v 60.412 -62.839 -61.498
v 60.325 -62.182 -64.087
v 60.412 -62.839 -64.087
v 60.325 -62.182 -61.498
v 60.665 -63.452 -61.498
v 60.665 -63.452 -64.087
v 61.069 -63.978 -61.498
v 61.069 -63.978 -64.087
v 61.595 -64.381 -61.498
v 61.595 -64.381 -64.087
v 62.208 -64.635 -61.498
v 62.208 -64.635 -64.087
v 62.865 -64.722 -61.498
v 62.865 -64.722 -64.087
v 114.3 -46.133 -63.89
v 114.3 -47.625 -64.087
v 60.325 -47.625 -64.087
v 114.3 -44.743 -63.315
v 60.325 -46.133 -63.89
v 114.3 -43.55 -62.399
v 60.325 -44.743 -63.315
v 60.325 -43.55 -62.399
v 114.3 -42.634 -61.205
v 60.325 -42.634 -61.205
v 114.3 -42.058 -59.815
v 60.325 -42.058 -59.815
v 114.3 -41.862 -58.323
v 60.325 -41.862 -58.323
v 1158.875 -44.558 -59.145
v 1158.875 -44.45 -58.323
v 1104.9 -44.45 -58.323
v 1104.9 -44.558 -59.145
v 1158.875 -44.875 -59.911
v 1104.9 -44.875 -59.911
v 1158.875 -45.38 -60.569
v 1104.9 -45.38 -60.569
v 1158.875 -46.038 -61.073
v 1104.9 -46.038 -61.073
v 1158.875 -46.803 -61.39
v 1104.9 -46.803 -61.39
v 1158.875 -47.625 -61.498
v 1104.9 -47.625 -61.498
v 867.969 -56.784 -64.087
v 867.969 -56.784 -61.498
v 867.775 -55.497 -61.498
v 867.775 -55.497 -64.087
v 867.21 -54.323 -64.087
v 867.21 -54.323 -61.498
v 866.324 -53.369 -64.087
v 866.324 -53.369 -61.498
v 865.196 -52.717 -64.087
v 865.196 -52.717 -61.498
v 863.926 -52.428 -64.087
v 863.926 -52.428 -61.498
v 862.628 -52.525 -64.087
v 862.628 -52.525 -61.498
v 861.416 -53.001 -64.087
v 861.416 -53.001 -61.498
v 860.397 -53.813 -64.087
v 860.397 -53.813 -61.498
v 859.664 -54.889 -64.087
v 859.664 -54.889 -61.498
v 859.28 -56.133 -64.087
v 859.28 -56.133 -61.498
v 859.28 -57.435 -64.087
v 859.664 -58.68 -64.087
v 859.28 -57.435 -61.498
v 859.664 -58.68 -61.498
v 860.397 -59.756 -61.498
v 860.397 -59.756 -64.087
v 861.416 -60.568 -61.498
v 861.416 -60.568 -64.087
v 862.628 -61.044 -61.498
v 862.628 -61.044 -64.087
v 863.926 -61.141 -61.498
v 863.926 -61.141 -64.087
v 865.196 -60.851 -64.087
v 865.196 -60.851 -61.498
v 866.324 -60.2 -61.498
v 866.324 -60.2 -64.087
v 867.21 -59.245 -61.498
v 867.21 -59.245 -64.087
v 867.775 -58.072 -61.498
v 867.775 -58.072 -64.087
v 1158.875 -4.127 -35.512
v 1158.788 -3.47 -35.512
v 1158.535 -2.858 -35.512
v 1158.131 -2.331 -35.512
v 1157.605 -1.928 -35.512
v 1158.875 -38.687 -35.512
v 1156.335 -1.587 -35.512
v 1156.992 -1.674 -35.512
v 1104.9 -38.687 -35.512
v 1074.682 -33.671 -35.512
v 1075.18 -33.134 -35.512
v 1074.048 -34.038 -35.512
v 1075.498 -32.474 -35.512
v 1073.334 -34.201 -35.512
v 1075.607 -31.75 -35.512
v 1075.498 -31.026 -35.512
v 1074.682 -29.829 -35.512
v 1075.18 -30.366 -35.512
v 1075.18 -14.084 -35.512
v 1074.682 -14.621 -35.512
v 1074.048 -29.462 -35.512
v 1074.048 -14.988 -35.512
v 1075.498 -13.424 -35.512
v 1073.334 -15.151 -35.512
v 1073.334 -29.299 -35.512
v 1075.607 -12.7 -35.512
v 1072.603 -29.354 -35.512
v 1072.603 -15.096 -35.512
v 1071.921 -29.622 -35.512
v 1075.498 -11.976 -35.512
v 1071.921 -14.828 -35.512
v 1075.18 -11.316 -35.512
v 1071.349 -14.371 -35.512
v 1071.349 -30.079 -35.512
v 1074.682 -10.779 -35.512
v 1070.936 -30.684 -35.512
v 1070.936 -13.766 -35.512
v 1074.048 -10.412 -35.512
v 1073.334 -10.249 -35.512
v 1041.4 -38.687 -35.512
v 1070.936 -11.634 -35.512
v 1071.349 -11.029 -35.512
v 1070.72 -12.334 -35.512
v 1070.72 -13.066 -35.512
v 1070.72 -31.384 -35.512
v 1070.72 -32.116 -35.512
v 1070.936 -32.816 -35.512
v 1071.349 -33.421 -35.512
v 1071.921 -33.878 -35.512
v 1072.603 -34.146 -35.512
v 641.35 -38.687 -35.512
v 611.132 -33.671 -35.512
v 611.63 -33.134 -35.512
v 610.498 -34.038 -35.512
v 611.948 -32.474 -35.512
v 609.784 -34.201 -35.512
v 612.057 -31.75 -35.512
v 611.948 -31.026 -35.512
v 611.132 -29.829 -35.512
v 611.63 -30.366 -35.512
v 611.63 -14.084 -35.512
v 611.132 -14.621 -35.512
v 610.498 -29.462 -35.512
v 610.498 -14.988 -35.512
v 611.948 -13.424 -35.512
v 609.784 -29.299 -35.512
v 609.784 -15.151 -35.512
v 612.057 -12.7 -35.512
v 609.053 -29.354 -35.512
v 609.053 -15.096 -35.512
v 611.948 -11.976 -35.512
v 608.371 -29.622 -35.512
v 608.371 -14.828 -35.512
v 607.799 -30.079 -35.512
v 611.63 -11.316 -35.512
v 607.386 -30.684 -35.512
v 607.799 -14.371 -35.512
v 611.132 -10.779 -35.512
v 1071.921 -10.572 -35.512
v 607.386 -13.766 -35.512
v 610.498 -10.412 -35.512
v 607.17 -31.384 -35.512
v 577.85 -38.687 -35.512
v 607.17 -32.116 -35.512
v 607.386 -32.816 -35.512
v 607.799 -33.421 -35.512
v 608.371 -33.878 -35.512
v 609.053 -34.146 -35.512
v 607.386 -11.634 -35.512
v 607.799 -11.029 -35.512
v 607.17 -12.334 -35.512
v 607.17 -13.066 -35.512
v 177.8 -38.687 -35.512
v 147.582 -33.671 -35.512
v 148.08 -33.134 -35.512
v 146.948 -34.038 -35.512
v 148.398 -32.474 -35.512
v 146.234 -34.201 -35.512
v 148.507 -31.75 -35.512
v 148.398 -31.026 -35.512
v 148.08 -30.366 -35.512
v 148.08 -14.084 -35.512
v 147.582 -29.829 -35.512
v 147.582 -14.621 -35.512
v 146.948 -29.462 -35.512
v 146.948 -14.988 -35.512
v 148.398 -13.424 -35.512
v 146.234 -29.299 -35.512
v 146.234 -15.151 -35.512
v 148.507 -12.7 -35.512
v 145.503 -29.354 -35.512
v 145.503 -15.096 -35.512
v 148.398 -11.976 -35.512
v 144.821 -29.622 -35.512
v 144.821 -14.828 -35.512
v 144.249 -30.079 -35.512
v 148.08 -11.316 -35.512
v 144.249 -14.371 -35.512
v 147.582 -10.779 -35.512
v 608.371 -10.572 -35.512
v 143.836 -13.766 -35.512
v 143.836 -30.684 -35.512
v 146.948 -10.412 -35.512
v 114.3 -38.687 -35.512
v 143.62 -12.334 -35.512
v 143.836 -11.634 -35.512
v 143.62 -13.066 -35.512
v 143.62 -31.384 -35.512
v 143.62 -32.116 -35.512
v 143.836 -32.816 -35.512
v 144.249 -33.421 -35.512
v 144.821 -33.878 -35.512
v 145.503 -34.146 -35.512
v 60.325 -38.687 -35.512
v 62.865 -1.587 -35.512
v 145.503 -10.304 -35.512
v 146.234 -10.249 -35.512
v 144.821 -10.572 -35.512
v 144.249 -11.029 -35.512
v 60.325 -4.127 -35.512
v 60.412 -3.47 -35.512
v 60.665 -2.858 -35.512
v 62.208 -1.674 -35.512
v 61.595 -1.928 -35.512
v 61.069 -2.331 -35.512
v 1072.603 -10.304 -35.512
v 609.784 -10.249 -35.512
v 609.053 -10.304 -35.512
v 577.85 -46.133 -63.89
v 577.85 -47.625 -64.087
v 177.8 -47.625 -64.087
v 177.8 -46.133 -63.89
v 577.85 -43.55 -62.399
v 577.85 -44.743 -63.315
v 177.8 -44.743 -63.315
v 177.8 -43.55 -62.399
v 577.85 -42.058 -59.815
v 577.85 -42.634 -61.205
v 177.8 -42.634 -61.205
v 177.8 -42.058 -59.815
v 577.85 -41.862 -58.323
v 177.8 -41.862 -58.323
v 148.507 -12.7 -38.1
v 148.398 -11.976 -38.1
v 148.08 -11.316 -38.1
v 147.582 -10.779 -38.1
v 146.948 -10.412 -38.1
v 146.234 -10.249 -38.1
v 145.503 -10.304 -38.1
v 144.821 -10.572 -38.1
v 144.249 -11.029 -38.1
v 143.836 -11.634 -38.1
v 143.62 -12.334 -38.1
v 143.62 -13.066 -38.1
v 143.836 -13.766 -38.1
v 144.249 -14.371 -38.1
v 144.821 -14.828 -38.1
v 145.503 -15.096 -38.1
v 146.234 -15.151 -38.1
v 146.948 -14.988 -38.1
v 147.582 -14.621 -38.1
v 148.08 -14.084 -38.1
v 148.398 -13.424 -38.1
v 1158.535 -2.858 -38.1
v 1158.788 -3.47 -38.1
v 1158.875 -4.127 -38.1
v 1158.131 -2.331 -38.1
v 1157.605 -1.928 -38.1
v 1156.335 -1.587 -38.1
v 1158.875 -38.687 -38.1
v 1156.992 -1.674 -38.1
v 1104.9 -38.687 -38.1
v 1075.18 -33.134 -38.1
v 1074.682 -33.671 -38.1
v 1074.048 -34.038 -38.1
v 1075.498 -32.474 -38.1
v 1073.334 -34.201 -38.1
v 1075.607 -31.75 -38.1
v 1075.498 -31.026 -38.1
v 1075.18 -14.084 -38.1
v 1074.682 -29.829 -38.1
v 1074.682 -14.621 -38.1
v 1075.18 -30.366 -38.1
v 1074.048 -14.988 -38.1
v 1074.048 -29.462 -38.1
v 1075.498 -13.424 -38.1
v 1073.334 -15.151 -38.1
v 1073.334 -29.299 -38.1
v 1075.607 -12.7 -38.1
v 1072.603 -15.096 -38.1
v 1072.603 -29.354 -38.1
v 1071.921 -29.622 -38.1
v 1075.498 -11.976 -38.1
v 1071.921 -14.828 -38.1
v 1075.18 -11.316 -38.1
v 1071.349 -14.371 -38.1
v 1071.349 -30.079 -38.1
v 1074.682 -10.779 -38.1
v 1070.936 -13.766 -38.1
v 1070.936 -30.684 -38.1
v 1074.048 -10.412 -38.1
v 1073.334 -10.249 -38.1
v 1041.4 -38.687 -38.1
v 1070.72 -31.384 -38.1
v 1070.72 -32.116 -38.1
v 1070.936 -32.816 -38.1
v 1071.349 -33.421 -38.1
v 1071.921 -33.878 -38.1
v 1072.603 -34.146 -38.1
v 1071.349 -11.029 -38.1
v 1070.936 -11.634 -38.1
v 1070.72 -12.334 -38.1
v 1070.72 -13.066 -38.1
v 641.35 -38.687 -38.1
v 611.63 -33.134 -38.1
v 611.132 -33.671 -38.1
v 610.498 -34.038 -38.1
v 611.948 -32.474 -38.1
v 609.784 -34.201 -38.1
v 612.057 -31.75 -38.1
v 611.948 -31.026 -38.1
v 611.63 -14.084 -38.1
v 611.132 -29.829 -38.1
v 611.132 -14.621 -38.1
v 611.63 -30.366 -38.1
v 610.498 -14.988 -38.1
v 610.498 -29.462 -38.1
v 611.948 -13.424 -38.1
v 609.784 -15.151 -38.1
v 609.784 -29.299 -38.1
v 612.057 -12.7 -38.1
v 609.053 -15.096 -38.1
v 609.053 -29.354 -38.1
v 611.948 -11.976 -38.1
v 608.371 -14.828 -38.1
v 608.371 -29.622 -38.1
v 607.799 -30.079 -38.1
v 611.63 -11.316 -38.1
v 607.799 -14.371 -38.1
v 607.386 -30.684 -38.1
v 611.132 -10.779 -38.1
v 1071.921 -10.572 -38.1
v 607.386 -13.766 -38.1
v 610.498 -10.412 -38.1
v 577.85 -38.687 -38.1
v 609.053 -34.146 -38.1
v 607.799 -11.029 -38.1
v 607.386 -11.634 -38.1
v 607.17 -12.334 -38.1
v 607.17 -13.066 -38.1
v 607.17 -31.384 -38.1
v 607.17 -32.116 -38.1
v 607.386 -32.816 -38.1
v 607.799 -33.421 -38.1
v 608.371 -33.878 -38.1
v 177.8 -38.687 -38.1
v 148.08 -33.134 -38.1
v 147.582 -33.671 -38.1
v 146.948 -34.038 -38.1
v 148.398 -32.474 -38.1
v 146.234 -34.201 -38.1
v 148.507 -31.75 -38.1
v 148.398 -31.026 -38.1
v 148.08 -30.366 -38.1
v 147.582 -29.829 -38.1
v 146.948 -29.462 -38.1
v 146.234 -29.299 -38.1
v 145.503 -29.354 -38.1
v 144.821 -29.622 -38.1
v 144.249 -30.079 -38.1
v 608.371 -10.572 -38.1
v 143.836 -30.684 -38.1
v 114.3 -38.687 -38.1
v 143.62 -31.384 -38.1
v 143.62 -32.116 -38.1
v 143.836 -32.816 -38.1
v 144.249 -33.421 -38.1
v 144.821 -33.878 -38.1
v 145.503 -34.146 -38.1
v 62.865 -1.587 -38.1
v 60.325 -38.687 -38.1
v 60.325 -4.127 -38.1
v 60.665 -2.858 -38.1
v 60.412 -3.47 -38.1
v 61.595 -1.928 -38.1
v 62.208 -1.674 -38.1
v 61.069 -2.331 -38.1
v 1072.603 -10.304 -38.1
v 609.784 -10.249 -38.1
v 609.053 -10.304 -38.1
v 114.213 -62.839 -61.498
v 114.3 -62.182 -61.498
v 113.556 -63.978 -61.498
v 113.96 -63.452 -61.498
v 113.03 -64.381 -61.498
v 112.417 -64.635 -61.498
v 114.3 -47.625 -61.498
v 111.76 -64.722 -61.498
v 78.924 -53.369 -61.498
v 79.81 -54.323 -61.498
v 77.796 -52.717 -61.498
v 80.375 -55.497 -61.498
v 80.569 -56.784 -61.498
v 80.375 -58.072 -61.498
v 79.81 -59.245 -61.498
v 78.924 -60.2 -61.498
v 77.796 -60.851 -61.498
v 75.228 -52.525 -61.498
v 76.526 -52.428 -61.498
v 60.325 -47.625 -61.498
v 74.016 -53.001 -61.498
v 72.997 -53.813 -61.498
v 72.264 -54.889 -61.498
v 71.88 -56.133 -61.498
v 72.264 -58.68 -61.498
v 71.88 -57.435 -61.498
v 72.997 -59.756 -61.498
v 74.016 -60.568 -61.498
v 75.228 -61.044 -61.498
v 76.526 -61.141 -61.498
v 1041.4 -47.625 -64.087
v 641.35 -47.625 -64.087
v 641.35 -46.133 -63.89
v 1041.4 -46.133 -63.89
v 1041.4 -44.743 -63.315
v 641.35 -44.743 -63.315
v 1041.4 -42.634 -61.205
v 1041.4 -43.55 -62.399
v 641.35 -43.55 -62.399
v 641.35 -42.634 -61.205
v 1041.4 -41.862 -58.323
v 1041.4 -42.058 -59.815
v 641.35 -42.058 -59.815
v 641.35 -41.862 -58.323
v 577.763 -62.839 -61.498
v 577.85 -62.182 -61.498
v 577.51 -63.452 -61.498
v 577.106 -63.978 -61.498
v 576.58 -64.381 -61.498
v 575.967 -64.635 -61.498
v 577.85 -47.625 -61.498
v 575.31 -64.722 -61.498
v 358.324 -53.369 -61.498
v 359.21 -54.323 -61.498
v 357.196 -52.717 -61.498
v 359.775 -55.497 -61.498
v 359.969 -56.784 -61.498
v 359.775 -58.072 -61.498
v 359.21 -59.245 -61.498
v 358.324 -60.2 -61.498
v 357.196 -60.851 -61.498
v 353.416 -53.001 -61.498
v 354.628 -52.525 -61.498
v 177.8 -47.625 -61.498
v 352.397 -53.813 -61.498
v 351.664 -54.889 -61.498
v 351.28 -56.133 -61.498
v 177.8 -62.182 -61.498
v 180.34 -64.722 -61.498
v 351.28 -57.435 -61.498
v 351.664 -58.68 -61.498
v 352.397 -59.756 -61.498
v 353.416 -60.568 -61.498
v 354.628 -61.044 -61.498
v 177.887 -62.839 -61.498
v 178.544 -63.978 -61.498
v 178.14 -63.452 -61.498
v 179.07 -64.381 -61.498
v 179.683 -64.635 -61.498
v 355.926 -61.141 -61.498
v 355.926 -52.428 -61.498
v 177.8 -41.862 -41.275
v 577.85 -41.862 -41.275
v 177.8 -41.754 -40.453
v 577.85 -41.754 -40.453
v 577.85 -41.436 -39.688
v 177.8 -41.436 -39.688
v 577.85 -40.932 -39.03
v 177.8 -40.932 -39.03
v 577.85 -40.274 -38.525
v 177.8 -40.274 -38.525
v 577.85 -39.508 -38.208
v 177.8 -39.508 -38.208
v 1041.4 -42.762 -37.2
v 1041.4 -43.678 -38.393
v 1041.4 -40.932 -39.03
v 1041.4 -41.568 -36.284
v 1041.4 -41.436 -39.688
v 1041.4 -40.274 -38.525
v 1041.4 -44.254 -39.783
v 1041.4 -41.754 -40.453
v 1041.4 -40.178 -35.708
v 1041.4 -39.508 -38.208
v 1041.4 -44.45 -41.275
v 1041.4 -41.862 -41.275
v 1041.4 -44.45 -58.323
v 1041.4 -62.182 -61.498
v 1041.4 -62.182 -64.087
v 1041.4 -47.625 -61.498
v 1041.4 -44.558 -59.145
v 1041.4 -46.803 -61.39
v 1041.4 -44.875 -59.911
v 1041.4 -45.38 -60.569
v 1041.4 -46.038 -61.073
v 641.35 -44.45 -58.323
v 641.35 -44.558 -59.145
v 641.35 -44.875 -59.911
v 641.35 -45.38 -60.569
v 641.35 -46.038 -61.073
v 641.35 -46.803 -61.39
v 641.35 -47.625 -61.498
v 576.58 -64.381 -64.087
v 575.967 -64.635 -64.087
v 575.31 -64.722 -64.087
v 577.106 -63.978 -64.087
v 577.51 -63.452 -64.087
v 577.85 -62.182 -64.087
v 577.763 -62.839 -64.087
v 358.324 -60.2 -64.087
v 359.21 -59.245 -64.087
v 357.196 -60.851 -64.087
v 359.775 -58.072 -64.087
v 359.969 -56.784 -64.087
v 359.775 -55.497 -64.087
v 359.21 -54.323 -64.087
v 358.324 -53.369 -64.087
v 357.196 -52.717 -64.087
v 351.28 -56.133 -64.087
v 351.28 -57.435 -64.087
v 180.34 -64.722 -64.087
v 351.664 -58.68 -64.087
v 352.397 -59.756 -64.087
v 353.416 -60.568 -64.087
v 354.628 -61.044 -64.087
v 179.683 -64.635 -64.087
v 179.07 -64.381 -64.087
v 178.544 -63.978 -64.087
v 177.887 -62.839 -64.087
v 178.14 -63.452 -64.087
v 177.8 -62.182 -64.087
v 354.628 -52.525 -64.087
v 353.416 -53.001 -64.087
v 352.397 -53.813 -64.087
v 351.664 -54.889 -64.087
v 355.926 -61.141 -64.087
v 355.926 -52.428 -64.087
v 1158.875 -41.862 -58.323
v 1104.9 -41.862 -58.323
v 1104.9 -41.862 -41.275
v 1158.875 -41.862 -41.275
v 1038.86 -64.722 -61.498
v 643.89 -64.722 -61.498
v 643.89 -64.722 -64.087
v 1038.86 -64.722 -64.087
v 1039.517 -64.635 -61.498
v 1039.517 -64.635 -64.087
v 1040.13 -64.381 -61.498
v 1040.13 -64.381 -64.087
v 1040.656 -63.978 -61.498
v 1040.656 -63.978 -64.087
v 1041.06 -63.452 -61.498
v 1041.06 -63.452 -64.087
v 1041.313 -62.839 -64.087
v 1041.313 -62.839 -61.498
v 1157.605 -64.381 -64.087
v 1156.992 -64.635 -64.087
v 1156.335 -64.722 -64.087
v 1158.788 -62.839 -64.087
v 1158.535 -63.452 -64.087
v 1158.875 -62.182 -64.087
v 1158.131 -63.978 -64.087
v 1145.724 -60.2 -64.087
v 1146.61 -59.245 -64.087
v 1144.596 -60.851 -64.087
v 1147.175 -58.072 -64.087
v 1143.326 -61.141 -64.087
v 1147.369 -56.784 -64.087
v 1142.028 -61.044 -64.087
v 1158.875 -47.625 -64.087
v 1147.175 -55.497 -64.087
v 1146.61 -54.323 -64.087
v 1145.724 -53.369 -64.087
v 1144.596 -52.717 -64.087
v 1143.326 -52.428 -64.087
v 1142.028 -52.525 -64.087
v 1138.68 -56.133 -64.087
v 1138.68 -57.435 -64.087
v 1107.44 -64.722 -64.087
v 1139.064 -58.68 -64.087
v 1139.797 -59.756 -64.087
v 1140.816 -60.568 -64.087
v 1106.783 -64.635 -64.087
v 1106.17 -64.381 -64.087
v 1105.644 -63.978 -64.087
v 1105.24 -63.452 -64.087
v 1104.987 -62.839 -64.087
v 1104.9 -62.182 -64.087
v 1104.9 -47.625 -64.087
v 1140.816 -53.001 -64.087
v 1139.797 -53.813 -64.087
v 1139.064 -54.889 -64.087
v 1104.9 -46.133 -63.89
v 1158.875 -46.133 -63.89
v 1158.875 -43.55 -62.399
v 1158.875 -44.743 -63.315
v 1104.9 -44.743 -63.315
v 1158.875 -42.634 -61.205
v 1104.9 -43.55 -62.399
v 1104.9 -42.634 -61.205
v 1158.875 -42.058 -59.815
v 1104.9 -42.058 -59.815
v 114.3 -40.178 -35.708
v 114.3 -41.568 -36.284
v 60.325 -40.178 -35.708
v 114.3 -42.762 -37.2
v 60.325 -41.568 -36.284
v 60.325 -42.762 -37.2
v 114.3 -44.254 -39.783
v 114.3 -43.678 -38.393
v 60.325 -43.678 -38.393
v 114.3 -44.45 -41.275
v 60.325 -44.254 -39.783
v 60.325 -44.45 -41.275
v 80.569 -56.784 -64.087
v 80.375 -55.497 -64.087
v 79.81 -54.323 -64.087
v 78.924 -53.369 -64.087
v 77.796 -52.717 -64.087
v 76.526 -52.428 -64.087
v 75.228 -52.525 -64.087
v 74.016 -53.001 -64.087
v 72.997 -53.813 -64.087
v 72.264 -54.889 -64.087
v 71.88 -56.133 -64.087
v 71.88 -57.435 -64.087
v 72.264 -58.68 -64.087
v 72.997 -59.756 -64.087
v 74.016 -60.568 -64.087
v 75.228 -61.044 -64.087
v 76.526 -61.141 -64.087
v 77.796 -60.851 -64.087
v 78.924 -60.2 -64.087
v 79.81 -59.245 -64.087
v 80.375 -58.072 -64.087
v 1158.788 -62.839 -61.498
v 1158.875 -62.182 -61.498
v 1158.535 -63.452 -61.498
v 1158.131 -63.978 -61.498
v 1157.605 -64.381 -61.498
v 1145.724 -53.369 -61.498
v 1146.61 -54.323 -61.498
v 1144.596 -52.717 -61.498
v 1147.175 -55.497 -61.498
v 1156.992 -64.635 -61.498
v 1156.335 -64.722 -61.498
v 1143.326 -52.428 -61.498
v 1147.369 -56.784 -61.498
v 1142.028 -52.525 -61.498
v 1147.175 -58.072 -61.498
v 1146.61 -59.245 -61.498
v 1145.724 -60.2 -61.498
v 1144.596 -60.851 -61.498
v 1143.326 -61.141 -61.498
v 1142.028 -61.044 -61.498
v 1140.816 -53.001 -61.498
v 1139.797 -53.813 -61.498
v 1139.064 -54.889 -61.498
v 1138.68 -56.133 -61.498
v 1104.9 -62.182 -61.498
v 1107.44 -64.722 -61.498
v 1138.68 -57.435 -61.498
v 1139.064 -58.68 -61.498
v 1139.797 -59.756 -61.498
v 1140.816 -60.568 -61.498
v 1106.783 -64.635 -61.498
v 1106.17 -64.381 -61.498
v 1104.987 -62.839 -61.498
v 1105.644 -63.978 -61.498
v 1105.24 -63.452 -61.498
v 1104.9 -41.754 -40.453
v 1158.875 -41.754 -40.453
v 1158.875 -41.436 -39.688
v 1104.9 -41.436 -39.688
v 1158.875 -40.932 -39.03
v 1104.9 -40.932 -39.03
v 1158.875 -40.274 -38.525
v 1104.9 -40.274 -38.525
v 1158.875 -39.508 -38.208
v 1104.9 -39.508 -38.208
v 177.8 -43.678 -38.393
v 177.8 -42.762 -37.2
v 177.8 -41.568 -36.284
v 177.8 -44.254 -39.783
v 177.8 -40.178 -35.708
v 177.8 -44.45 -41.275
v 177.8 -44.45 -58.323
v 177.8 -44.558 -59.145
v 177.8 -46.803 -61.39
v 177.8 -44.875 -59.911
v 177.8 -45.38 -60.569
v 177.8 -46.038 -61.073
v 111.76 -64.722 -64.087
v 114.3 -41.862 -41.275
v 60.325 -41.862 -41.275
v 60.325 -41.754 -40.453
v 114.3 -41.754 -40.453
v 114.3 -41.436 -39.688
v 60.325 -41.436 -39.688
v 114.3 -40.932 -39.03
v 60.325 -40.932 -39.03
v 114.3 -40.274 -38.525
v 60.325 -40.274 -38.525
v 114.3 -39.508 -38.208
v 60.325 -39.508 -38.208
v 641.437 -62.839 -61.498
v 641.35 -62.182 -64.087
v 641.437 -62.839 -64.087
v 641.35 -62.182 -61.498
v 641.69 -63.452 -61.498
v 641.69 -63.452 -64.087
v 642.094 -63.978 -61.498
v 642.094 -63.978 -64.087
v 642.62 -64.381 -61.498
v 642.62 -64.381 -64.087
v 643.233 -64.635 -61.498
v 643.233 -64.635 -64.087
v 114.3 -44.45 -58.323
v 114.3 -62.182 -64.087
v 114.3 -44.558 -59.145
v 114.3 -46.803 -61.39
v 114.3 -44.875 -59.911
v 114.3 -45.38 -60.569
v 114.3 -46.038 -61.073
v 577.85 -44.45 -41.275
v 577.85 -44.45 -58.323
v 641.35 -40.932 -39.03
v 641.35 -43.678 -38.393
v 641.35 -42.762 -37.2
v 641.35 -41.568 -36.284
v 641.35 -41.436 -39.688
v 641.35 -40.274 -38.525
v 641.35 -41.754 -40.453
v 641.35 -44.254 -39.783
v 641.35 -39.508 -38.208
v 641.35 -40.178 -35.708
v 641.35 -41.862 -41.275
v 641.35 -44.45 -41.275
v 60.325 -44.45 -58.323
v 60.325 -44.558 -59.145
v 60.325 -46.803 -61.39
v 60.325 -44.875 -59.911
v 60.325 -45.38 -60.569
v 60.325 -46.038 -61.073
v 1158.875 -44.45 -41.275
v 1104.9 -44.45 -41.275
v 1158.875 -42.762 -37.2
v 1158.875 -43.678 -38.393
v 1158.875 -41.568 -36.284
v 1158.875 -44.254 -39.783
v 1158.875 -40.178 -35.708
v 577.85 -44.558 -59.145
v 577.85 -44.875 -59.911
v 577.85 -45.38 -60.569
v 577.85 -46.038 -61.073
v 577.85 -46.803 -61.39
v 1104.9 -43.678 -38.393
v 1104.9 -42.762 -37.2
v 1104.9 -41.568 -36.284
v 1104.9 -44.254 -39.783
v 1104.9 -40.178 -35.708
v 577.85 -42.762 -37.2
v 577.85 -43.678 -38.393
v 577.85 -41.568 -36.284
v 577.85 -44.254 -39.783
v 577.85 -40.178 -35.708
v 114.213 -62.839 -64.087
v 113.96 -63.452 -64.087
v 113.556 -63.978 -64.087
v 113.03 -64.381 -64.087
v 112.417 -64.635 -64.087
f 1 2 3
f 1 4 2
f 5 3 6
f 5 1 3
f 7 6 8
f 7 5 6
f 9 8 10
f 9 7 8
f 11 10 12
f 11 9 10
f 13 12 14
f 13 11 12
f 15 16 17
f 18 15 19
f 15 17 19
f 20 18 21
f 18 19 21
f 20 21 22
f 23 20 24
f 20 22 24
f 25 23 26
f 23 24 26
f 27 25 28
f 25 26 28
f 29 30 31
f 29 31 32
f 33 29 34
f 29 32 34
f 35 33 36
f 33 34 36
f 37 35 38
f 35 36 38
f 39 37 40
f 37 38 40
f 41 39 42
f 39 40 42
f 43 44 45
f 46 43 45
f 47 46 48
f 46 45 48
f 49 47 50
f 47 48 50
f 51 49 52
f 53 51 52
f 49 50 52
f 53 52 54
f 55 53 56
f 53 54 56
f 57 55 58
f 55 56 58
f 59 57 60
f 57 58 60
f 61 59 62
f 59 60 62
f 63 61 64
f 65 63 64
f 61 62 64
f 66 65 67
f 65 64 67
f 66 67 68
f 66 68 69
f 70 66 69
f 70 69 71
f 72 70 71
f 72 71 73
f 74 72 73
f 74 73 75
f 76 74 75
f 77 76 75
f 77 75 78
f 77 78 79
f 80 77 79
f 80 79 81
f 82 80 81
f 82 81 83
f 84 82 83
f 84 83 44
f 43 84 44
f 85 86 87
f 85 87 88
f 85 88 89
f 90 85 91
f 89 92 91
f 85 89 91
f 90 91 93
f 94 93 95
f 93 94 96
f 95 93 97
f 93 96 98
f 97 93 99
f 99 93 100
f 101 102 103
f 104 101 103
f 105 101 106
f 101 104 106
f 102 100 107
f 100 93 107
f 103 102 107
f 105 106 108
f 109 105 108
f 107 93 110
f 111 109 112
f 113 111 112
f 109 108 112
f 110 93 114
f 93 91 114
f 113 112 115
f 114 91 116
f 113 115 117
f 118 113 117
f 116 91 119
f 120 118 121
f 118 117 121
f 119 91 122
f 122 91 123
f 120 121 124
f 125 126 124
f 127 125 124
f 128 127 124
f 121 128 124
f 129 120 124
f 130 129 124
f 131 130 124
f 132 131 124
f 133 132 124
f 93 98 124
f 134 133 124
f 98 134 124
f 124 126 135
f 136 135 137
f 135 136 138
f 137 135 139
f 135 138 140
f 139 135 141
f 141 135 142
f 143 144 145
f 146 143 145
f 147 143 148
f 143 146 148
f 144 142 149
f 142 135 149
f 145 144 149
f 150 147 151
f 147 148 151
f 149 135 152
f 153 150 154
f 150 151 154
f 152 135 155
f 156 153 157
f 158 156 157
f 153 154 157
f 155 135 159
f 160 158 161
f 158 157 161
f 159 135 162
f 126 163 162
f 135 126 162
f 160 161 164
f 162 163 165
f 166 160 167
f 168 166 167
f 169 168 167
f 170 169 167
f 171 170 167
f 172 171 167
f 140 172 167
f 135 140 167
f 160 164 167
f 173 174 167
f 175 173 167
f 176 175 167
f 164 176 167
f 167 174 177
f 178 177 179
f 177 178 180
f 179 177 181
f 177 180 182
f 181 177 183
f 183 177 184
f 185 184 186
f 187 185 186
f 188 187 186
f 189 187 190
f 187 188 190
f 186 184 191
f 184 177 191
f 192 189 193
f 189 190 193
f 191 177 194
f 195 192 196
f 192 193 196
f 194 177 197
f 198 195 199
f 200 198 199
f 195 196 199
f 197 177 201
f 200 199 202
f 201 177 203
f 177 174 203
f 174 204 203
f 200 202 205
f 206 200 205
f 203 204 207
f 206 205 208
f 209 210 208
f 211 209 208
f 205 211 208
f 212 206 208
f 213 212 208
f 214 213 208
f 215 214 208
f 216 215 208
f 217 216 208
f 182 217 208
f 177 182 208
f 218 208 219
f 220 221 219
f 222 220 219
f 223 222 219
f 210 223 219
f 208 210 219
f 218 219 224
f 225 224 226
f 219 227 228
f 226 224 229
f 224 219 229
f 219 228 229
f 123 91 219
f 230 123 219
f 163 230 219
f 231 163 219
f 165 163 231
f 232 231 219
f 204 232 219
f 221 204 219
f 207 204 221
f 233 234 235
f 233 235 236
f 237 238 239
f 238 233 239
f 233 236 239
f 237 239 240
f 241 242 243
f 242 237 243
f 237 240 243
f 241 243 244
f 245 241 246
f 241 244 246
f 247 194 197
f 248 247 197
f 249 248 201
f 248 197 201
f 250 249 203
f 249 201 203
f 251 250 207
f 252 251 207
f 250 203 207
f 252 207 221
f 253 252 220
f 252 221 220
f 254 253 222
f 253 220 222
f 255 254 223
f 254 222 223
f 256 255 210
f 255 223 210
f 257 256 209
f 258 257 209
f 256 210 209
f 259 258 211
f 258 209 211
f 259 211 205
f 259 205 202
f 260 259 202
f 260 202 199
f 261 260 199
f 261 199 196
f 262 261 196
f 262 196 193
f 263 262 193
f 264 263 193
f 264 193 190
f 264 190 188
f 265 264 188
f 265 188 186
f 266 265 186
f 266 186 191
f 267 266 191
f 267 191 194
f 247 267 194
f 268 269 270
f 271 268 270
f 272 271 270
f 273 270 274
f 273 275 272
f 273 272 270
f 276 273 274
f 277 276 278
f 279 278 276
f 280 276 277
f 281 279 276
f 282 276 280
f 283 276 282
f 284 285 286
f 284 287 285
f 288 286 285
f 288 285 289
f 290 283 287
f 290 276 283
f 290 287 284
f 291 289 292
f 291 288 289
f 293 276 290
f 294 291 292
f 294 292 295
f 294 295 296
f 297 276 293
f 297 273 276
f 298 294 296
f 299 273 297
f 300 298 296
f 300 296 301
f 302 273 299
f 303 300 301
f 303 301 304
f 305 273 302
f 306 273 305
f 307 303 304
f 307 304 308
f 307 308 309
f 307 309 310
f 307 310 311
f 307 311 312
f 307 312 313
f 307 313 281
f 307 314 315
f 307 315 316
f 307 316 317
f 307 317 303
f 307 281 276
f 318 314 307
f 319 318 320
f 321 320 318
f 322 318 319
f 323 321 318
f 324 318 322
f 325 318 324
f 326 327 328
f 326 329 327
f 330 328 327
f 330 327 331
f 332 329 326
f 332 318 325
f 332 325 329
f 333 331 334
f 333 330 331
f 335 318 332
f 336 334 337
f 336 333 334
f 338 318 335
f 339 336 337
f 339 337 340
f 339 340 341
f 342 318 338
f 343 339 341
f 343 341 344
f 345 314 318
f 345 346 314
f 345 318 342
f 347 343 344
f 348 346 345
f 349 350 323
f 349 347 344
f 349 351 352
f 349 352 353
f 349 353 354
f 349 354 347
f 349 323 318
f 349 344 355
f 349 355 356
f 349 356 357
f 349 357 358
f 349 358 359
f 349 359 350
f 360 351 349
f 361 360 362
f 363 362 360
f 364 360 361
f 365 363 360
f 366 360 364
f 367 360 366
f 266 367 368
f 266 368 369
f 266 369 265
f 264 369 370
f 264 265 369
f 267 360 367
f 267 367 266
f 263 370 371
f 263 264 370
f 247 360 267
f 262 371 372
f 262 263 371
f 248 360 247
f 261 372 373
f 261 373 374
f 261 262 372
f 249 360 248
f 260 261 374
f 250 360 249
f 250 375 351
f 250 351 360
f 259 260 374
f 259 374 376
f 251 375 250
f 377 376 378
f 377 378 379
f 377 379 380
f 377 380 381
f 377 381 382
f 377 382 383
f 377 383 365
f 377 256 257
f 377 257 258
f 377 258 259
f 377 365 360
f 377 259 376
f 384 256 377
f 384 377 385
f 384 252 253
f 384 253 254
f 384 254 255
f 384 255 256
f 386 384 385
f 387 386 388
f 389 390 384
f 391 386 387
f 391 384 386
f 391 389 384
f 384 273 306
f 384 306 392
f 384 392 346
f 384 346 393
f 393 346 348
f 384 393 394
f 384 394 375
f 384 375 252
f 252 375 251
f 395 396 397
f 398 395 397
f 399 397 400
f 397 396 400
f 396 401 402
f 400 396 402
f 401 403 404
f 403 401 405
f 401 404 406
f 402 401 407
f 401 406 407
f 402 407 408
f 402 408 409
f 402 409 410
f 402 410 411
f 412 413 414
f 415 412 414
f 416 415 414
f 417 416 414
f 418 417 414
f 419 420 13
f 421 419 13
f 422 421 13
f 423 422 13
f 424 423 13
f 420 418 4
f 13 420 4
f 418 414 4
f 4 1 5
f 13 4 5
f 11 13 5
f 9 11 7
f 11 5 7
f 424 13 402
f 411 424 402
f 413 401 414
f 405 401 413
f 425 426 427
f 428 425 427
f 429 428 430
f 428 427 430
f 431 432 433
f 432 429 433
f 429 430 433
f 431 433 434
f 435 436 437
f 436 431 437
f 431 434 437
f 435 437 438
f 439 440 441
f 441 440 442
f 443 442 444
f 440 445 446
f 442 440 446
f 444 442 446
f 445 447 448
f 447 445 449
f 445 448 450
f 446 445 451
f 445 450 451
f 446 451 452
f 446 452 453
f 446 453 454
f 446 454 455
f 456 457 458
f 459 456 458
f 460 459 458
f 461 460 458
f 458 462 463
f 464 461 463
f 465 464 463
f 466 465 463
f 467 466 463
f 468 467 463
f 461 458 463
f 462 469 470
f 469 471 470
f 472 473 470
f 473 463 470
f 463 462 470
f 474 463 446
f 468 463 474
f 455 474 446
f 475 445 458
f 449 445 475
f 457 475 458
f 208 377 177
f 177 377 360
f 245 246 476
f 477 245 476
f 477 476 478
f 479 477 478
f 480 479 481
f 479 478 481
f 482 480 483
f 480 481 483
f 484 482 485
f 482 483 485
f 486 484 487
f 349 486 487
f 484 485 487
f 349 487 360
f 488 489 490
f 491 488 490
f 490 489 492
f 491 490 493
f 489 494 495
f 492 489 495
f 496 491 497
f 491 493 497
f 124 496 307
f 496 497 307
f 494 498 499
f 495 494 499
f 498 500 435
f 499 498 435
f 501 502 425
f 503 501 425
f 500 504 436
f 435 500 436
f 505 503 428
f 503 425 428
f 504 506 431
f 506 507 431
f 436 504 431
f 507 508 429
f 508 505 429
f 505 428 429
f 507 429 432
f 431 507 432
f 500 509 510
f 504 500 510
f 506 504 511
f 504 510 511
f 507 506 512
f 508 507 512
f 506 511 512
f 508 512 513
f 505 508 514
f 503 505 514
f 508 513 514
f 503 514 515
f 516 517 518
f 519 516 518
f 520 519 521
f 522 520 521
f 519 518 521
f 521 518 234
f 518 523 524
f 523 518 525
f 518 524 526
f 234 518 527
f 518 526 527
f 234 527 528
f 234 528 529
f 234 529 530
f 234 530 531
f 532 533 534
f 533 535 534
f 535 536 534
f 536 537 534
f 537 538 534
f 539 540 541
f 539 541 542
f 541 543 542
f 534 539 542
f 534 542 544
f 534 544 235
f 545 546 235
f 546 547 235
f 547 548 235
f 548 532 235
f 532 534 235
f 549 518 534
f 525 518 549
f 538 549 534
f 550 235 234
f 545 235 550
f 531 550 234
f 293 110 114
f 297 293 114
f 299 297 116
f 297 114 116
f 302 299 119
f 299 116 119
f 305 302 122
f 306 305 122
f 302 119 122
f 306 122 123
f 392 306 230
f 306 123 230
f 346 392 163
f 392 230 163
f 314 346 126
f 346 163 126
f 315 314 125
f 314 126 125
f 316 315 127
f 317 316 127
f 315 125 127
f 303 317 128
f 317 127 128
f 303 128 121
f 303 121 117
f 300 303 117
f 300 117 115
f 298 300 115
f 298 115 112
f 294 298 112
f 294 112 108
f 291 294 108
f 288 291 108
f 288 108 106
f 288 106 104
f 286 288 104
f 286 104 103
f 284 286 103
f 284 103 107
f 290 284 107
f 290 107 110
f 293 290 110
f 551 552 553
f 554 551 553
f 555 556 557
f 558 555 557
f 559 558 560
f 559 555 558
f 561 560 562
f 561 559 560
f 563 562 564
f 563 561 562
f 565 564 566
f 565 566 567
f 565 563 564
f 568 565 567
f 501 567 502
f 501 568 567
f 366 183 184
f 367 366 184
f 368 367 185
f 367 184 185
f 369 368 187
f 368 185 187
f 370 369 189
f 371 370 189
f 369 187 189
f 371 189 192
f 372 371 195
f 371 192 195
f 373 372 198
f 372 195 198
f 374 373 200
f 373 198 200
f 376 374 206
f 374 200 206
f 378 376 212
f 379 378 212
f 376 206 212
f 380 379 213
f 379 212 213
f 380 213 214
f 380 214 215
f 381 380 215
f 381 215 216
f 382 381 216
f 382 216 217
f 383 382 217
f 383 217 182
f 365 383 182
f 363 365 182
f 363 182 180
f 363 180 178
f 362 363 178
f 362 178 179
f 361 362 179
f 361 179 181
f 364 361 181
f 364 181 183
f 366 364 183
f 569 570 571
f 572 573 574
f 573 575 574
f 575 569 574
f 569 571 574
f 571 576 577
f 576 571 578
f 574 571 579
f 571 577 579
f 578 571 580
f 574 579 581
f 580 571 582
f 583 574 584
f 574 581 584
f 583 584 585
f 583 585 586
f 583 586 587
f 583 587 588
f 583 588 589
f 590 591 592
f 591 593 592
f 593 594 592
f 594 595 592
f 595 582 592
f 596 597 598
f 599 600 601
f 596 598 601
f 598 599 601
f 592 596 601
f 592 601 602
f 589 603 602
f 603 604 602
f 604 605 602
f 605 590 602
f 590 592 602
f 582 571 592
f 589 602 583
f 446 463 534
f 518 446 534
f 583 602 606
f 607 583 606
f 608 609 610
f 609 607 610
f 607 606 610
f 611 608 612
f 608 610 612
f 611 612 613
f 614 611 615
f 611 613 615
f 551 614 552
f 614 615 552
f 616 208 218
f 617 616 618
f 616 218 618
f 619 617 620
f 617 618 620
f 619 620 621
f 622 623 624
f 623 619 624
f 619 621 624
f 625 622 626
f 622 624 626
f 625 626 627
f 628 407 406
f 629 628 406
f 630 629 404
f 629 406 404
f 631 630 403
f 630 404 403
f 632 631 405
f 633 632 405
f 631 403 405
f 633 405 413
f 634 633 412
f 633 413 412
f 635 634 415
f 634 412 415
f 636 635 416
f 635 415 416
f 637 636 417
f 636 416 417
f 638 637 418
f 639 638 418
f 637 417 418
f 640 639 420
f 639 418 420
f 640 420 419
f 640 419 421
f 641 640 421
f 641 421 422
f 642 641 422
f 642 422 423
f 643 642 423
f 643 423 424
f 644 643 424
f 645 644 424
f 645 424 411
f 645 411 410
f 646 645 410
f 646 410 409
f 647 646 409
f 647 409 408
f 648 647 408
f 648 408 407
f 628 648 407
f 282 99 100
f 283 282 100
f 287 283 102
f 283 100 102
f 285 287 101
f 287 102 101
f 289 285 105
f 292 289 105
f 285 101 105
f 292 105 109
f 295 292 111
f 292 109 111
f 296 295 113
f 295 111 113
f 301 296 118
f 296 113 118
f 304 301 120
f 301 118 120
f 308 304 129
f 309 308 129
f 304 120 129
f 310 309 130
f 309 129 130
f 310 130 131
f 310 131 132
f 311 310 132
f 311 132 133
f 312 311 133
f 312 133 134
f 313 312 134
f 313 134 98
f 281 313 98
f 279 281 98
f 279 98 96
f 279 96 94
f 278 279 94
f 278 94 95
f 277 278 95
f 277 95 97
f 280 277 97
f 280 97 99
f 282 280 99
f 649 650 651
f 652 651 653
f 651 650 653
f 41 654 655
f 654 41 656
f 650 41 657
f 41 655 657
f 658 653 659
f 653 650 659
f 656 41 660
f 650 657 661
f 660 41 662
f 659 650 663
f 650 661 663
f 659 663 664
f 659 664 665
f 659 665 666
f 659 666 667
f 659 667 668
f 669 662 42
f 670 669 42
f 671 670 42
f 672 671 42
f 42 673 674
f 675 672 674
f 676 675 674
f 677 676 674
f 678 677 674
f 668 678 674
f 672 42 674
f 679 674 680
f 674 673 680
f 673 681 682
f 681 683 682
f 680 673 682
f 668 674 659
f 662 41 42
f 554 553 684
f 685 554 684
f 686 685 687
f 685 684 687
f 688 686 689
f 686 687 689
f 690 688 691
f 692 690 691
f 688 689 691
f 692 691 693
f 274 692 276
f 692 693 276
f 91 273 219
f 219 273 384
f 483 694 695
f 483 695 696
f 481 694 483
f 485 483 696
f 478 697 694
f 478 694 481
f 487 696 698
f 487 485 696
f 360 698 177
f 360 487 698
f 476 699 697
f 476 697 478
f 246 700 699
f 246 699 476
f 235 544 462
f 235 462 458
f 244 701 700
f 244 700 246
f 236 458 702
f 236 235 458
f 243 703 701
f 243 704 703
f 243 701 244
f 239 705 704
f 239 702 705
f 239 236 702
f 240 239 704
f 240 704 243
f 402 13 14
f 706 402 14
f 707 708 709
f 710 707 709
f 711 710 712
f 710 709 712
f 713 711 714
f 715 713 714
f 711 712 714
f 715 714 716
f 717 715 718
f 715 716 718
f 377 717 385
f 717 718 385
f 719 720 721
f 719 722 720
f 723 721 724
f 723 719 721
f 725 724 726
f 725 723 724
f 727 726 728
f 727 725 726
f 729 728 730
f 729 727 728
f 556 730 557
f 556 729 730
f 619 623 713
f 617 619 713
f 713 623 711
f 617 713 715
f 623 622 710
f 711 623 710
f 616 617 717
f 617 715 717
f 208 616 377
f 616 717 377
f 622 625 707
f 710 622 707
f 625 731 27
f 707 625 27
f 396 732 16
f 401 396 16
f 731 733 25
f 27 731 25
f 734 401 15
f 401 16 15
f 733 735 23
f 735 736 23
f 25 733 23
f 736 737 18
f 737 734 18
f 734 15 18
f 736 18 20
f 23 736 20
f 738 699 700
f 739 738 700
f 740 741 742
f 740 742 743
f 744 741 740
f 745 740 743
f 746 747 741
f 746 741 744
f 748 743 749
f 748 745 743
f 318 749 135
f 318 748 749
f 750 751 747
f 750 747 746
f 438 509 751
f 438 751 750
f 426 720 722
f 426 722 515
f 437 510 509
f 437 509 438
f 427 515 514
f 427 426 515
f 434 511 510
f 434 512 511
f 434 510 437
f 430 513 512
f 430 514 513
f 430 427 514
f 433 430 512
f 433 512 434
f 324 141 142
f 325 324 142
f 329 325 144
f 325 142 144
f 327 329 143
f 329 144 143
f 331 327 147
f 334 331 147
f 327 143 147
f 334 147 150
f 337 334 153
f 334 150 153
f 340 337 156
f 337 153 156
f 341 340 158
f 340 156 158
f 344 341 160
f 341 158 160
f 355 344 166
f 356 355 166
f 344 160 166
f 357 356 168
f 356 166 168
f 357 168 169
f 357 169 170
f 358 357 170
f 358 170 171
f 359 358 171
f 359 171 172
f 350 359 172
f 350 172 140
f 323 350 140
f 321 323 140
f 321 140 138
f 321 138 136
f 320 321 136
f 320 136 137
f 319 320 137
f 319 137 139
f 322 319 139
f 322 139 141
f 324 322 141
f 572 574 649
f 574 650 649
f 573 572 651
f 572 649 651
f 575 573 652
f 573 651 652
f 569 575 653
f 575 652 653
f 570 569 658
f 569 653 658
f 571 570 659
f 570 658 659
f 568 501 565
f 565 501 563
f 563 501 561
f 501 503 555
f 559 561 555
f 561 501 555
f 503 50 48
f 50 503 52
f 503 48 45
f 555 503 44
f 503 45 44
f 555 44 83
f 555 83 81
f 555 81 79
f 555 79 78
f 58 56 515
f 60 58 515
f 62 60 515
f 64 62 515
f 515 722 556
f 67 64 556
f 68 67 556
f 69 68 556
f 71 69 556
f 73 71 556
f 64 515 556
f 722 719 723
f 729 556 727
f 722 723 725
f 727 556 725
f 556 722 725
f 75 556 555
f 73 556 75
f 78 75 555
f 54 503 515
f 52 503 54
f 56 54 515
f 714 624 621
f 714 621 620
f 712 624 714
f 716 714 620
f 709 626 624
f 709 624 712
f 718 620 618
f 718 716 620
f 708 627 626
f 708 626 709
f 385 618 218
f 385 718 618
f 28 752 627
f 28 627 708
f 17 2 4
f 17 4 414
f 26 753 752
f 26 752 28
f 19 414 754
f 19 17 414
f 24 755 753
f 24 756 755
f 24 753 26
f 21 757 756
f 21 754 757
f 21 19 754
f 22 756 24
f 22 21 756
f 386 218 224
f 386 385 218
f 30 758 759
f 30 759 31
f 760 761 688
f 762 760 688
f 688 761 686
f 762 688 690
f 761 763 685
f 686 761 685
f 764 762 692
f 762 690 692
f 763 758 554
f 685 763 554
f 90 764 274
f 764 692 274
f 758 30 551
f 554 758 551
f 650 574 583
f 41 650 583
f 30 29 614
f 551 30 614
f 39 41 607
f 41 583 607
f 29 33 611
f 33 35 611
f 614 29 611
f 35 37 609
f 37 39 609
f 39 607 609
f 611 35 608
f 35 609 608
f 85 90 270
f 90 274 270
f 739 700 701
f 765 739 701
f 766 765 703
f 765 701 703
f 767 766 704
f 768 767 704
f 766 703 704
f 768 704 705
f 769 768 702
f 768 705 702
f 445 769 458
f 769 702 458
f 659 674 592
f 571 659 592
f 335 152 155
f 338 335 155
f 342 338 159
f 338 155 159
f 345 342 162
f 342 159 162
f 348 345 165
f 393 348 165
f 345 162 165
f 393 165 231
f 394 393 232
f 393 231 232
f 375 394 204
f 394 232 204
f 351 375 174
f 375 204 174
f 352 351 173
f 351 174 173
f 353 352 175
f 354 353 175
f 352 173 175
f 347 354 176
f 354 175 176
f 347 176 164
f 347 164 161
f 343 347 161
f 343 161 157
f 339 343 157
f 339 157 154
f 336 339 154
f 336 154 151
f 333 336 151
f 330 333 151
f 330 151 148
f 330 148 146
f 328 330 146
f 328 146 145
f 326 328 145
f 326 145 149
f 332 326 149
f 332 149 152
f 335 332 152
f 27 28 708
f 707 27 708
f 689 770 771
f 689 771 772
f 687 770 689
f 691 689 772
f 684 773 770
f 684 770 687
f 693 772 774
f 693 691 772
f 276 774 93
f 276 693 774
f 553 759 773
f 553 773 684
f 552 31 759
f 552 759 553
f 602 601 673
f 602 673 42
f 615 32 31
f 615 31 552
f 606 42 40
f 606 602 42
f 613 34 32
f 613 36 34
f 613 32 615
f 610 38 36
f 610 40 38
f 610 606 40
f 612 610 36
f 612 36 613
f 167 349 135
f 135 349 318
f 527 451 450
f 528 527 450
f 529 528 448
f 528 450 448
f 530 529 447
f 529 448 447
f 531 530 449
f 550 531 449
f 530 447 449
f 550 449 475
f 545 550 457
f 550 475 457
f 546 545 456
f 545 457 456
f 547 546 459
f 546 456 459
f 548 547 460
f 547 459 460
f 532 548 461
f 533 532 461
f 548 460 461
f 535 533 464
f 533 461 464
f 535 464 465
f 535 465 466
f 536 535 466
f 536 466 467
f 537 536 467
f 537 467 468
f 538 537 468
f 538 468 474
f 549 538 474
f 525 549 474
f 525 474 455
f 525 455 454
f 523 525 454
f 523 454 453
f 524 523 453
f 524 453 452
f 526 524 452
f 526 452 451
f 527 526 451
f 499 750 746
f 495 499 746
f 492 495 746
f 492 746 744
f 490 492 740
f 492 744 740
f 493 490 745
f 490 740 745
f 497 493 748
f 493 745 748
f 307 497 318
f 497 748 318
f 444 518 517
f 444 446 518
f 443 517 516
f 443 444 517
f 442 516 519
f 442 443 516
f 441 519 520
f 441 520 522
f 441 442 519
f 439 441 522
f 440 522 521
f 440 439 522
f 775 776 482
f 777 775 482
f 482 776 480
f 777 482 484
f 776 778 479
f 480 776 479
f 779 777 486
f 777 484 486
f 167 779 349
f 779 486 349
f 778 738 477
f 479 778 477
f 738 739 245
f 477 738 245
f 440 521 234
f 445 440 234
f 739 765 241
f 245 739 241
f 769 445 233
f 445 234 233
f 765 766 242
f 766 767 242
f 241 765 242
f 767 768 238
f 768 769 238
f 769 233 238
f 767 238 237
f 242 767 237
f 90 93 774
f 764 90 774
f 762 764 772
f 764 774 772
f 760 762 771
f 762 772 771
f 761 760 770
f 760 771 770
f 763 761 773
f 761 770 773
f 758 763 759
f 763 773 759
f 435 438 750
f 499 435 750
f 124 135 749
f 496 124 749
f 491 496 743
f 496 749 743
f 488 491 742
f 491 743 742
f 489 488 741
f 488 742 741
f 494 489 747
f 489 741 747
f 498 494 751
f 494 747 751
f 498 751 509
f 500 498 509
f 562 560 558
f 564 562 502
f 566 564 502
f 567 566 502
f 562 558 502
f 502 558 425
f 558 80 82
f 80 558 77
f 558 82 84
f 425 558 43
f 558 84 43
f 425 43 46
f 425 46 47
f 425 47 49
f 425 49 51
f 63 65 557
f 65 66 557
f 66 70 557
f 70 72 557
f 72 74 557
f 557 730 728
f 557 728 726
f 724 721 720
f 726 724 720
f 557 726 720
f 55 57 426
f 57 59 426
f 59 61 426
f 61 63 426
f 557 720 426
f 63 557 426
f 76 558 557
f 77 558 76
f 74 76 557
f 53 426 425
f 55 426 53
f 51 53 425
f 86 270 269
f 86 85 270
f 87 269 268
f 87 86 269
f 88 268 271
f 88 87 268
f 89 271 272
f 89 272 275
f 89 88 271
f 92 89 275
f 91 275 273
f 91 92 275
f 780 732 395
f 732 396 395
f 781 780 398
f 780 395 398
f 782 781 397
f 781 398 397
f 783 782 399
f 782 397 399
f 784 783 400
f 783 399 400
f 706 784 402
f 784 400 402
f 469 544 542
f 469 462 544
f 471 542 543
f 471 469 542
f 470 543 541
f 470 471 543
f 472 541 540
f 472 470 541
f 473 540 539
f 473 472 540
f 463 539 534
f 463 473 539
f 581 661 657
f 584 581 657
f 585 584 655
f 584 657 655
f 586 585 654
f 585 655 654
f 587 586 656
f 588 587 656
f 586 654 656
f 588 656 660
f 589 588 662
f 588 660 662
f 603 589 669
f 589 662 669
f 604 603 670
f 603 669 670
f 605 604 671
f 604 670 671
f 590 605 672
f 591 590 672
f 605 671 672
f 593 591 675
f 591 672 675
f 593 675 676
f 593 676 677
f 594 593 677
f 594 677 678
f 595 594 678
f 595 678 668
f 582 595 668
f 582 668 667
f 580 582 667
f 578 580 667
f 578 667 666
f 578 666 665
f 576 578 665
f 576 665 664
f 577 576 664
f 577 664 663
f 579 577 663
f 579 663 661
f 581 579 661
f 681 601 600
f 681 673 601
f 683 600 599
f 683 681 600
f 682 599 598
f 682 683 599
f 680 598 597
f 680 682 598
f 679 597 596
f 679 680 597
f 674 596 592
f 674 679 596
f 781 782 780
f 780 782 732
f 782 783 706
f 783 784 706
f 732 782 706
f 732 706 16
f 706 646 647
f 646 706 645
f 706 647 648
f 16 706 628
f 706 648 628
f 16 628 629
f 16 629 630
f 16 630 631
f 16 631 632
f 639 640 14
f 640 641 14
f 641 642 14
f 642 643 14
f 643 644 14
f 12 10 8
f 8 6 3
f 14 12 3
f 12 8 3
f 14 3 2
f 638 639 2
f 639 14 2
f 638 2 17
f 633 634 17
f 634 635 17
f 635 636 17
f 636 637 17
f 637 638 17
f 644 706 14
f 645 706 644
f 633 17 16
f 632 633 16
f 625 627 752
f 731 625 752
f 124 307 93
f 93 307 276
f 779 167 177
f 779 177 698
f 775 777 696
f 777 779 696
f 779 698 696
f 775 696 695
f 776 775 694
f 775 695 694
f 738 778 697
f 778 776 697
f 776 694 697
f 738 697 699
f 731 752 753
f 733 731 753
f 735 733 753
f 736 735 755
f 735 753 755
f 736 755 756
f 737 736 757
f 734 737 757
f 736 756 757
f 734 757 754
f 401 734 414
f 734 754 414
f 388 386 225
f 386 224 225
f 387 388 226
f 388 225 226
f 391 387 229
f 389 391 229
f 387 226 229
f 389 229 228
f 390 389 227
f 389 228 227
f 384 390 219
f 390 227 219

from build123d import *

# Parameters (mm, degrees)
BASE_FLANGE1_DEPTH                        = 1219.2
F_10_0_1935_DIAMETER_HOLE1_D              = 4.9149
HOLE_FOR_1_4_SELF_CLINCHING_NUTS_S_SS_C_D = 8.7376
SKETCH15_W                                = 38.1
SKETCH15_H                                = 22.86
CUT_EXTRUDE4_DEPTH                        = 5.76326
SKETCH16_W                                = 107.95
SKETCH16_H                                = 5.76326
SKETCH16_W_2                              = 171.45
CUT_EXTRUDE5_DEPTH                        = 1222.511012488
HOLE_FOR_1_4_SELF_CLINCHING_NUTS_S_2_D    = 8.7376
CUT_EXTRUDE7_REACH                        = 1224.598
SKETCH27_W                                = 63.5
SKETCH27_H                                = 26.035
SKETCH28_W                                = 60.325
SKETCH28_H                                = 58.95848
CUT_EXTRUDE8_DEPTH                        = 1223.597502808
SKETCH32_W                                = 38.1
SKETCH32_H                                = 5.76326
CUT_EXTRUDE9_DEPTH                        = 1055.864621408
SKETCH30_W                                = 1098.55
SKETCH30_H                                = 4.17576
BOSS_EXTRUDE1_DEPTH                       = 2.58826
FILLET1_R                                 = 2.54


# Read off the part's stored shape, not the designer's step: Base-Flange1
with BuildPart() as part:
    # Base-Flange1 outline → Base-Flange1 (new body)
    with BuildSketch(Plane(origin=(0, 0, 0), x_dir=(0, 0, -1), z_dir=(1, 0, 0))):
        with BuildLine():
            Line((61.49848, -47.625), (61.49848, -64.72174))
            Line((61.49848, -64.72174), (64.08674, -64.72174))
            Line((64.08674, -64.72174), (64.08674, -47.625))
            ThreePointArc((64.08674, -47.625), (62.398720228, -43.549759772), (58.32348, -41.86174))
            Line((58.32348, -41.86174), (41.275, -41.86174))
            ThreePointArc((41.275, -41.86174), (39.02993597, -40.93180403), (38.1, -38.68674))
            Line((38.1, -38.68674), (38.1, -5.76326))
            ThreePointArc((38.1, -5.76326), (36.411980228, -1.688019772), (32.33674, 0))
            Line((32.33674, 0), (0, 0))
            Line((0, 0), (0, -2.58826))
            Line((0, -2.58826), (32.33674, -2.58826))
            ThreePointArc((32.33674, -2.58826), (34.58180403, -3.51819597), (35.51174, -5.76326))
            Line((35.51174, -5.76326), (35.51174, -38.68674))
            ThreePointArc((35.51174, -38.68674), (37.199759772, -42.761980228), (41.275, -44.45))
            Line((41.275, -44.45), (58.32348, -44.45))
            ThreePointArc((58.32348, -44.45), (60.56854403, -45.37993597), (61.49848, -47.625))
        make_face()
    extrude(amount=BASE_FLANGE1_DEPTH)

    # #10 (0.1935) Diameter Hole1 (through all)
    with Locations(Plane(origin=(0, 0, -38.1), x_dir=(-1, 0, 0), z_dir=(0, 0, -1))):
        with Locations((-146.05, -12.7), (-609.6, -12.7), (-609.6, -31.75), (-1073.15, -12.7), (-1073.15, -31.75), (-146.05, -31.75)):
            Hole(F_10_0_1935_DIAMETER_HOLE1_D / 2)

    # Hole for 1_4 Self-clinching Nuts _S_SS_C (through all)
    with Locations(Plane(origin=(0, -2.58826, 0), x_dir=(-1, 0, 0), z_dir=(0, -1, 0))):
        with Locations((-304.8, 13.28674), (-914.4, 13.28674)):
            Hole(HOLE_FOR_1_4_SELF_CLINCHING_NUTS_S_SS_C_D / 2)

    # Sketch15 → Cut-Extrude4 (cut)
    with BuildSketch(Plane(origin=(0, 0, -64.08674), x_dir=(-1, 0, 0), z_dir=(0, 0, -1))):
        with Locations((-1200.15, -53.29174)):
            Rectangle(SKETCH15_W, SKETCH15_H)
        with Locations((-19.05, -53.29174)):
            Rectangle(SKETCH15_W, SKETCH15_H)
    extrude(amount=-CUT_EXTRUDE4_DEPTH, mode=Mode.SUBTRACT)

    # Sketch16 → Cut-Extrude5 (cut, through all)
    with BuildSketch(Plane(origin=(0, 0, -38.1), x_dir=(-1, 0, 0), z_dir=(0, 0, -1))):
        with Locations((-1165.225, -2.88163)):
            Rectangle(SKETCH16_W, SKETCH16_H)
        with Locations((-609.6, -2.88163)):
            Rectangle(SKETCH16_W_2, SKETCH16_H)
        with Locations((-53.975, -2.88163)):
            Rectangle(SKETCH16_W, SKETCH16_H)
    extrude(amount=-CUT_EXTRUDE5_DEPTH, mode=Mode.SUBTRACT)

    # Hole for 1_4 Self-clinching Nuts _S_ 2 (through all)
    with Locations(Plane(origin=(0, 0, -64.08674), x_dir=(-1, 0, 0), z_dir=(0, 0, -1))):
        with Locations((-1143, -56.78424), (-863.6, -56.78424), (-355.6, -56.78424), (-76.2, -56.78424)):
            Hole(HOLE_FOR_1_4_SELF_CLINCHING_NUTS_S_2_D / 2)

    # Cut-Extrude7: up to this face of the body (flat: up to its plane)
    cut_extrude7_end = Plane(part.part.faces().sort_by_distance((609.6, -22.225, -35.51174))[0])
    # Sketch27 → Cut-Extrude7 (cut, up to the picked face)
    with BuildSketch(Plane.XY.offset(-64.08674), mode=Mode.PRIVATE) as cut_extrude7_sk1:
        with Locations((146.05, -51.70424)):
            Rectangle(SKETCH27_W, SKETCH27_H)
    cut_extrude7_tool1 = split(extrude(cut_extrude7_sk1.sketch, amount=CUT_EXTRUDE7_REACH, mode=Mode.PRIVATE), bisect_by=cut_extrude7_end, keep=Keep.BOTH, mode=Mode.PRIVATE)
    # Sketch27 → Cut-Extrude7 (cut, up to the picked face)
    with BuildSketch(Plane.XY.offset(-64.08674), mode=Mode.PRIVATE) as cut_extrude7_sk2:
        with Locations((1073.15, -51.70424)):
            Rectangle(SKETCH27_W, SKETCH27_H)
    cut_extrude7_tool2 = split(extrude(cut_extrude7_sk2.sketch, amount=CUT_EXTRUDE7_REACH, mode=Mode.PRIVATE), bisect_by=cut_extrude7_end, keep=Keep.BOTH, mode=Mode.PRIVATE)
    # Sketch27 → Cut-Extrude7 (cut, up to the picked face)
    with BuildSketch(Plane.XY.offset(-64.08674), mode=Mode.PRIVATE) as cut_extrude7_sk3:
        with Locations((609.6, -51.70424)):
            Rectangle(SKETCH27_W, SKETCH27_H)
    cut_extrude7_tool3 = split(extrude(cut_extrude7_sk3.sketch, amount=CUT_EXTRUDE7_REACH, mode=Mode.PRIVATE), bisect_by=cut_extrude7_end, keep=Keep.BOTH, mode=Mode.PRIVATE)
    add(cut_extrude7_tool1.solids().sort_by(Axis((146.05, -51.70424, -64.08674), (0, 0, 1)))[0], mode=Mode.SUBTRACT)
    add(cut_extrude7_tool2.solids().sort_by(Axis((1073.15, -51.70424, -64.08674), (0, 0, 1)))[0], mode=Mode.SUBTRACT)
    add(cut_extrude7_tool3.solids().sort_by(Axis((609.6, -51.70424, -64.08674), (0, 0, 1)))[0], mode=Mode.SUBTRACT)

    # Sketch28 → Cut-Extrude8 (cut, through all)
    with BuildSketch(Plane(origin=(0, 0, -64.08674), x_dir=(-1, 0, 0), z_dir=(0, 0, -1))):
        with Locations((-1189.0375, -35.2425)):
            Rectangle(SKETCH28_W, SKETCH28_H)
        with Locations((-30.1625, -35.2425)):
            Rectangle(SKETCH28_W, SKETCH28_H)
    extrude(amount=-CUT_EXTRUDE8_DEPTH, mode=Mode.SUBTRACT)

    # Sketch32 → Cut-Extrude9 (cut, through all)
    with BuildSketch(Plane(origin=(1111.25, 0, 0), x_dir=(0, 0, -1), z_dir=(1, 0, 0))):
        with Locations((19.05, -2.88163)):
            Rectangle(SKETCH32_W, SKETCH32_H)
    extrude(amount=-CUT_EXTRUDE9_DEPTH, mode=Mode.SUBTRACT)

    # Sketch30 → Boss-Extrude1 (add)
    with BuildSketch(Plane(origin=(0, 0, -38.1), x_dir=(-1, 0, 0), z_dir=(0, 0, -1))):
        with Locations((-609.6, -3.67538)):
            Rectangle(SKETCH30_W, SKETCH30_H)
    extrude(amount=-BOSS_EXTRUDE1_DEPTH)

    # Fillet1
    fillet1_edges = [part.edges().sort_by_distance(p)[0] for p in [
        (1041.4, -64.72174, -62.79261),
        (1158.875, -1.5875, -36.80587),
        (60.325, -1.5875, -36.80587),
        (177.8, -64.72174, -62.79261),
        (60.325, -64.72174, -62.79261),
        (641.35, -64.72174, -62.79261),
        (1104.9, -64.72174, -62.79261),
        (1158.875, -64.72174, -62.79261),
        (114.3, -64.72174, -62.79261),
        (577.85, -64.72174, -62.79261),
    ]]
    fillet(fillet1_edges, radius=FILLET1_R)


solid = part.part
